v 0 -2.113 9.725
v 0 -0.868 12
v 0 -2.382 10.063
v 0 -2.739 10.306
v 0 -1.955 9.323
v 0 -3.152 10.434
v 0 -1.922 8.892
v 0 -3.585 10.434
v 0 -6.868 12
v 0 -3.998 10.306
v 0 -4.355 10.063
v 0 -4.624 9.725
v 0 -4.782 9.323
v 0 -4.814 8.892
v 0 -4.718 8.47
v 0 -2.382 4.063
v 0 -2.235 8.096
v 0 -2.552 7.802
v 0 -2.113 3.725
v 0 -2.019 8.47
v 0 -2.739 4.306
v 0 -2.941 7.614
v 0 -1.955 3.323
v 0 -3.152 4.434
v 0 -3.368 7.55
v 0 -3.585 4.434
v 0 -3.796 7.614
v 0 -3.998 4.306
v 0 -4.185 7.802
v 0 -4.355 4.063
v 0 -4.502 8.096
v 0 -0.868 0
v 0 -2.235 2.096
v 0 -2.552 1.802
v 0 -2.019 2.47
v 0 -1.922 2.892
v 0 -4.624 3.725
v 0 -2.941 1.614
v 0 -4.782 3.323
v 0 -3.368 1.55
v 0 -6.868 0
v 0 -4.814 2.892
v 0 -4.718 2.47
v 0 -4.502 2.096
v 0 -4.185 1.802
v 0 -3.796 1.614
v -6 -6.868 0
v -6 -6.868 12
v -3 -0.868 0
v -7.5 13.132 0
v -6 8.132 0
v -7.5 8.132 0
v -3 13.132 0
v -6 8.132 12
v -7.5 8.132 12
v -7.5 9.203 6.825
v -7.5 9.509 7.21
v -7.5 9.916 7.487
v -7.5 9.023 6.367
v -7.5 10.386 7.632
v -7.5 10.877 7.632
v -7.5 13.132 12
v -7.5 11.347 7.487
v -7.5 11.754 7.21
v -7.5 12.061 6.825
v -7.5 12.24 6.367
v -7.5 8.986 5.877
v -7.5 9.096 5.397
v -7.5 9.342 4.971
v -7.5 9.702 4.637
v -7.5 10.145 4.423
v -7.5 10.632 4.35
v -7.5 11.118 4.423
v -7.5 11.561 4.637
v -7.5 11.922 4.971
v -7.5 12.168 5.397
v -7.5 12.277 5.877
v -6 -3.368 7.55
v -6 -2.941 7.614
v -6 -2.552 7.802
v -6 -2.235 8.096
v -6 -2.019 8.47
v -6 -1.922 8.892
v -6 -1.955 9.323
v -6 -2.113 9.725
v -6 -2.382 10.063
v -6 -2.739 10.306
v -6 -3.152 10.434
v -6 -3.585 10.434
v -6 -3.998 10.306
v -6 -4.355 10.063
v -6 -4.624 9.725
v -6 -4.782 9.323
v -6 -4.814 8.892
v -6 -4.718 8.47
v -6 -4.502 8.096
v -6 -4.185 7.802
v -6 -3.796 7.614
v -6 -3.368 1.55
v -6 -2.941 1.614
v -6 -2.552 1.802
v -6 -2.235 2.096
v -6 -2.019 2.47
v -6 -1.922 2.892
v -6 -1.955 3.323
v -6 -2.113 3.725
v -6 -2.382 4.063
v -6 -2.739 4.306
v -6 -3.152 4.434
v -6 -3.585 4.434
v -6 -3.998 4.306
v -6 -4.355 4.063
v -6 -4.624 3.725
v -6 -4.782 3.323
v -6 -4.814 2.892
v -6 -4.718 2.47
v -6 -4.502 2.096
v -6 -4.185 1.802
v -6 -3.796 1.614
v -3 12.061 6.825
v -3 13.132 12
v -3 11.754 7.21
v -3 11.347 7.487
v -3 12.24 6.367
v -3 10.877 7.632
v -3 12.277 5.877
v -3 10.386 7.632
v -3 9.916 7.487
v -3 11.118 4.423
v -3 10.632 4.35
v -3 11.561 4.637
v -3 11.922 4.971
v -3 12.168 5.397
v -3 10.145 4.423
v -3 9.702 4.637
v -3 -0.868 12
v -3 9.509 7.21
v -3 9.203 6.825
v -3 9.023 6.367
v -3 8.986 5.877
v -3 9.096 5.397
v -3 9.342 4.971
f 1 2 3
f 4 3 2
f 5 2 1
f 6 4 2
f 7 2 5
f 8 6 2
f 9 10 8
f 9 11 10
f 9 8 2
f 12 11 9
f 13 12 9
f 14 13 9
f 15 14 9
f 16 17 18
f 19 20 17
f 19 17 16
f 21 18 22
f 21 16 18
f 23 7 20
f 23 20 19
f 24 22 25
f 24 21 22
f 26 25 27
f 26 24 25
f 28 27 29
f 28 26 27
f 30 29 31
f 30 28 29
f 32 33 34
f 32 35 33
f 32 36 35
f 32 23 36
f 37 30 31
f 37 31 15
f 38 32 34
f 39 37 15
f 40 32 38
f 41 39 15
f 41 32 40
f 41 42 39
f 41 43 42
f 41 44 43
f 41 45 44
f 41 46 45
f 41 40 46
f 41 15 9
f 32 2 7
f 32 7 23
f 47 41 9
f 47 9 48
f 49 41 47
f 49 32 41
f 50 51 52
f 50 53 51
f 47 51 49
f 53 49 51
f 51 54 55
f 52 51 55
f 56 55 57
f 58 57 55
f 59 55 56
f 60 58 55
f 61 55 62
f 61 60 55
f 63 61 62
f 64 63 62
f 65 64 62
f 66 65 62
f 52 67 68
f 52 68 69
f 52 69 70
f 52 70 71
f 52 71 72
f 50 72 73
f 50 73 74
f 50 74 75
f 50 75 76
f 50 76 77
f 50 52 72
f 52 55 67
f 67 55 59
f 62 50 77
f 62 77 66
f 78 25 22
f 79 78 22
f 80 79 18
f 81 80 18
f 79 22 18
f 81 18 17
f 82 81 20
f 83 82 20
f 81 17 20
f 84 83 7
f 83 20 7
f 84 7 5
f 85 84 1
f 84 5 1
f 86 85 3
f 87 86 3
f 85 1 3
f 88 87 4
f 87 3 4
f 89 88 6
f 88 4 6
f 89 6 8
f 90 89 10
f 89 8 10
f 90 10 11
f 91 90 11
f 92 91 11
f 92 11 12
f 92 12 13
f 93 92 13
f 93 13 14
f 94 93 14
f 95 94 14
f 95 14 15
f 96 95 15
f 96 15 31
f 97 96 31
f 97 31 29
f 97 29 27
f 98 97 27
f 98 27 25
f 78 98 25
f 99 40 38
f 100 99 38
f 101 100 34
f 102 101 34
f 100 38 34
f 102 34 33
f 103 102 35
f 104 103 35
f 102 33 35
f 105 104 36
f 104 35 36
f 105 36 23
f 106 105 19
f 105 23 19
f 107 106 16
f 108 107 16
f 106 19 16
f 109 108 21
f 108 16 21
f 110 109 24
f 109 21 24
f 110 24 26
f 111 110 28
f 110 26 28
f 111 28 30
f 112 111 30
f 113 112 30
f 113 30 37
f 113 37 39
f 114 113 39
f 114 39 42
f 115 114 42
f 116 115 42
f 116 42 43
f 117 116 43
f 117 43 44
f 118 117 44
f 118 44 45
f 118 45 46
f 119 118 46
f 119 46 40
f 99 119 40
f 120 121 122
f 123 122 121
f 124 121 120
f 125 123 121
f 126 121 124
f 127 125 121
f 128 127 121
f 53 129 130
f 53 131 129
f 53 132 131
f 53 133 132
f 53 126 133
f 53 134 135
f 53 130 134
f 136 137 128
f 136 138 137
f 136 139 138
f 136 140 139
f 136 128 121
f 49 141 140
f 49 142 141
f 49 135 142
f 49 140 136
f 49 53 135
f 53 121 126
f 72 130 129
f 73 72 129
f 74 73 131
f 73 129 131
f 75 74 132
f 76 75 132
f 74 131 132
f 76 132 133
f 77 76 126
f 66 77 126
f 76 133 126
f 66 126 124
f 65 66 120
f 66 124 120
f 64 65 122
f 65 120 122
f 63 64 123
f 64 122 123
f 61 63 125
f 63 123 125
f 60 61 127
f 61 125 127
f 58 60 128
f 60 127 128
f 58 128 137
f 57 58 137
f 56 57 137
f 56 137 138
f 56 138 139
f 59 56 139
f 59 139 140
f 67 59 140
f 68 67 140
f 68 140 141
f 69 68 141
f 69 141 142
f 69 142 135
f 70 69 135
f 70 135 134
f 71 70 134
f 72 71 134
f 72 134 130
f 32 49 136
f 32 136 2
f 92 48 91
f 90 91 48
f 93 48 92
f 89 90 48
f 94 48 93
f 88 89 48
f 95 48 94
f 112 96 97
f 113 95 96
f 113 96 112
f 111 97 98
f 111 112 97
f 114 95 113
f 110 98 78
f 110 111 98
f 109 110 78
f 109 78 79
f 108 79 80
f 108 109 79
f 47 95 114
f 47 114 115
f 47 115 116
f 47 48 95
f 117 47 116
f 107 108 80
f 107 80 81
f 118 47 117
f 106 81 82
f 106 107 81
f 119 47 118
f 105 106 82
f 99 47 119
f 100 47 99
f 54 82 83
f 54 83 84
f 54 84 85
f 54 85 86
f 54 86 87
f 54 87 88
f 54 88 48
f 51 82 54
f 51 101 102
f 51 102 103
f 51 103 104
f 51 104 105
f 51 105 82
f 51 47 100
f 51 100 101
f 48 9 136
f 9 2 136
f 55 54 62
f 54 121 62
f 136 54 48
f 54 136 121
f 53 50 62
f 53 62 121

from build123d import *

# Parameters (mm, degrees)
BOSS_EXTRUDE1_DEPTH         = 12
M2_5_CLEARANCE_HOLE1_D      = 2.9
TAP_DRILL_FOR_M4X0_7_TAP1_D = 3.3


with BuildPart() as part:
    # Sketch1 → Boss-Extrude1 (new body)
    with BuildSketch(Plane.XY):
        Polygon((0, -6.868421053), (-6, -6.868421053), (-6, 8.131578947), (-7.5, 8.131578947), (-7.5, 13.131578947), (-3, 13.131578947), (-3, -0.868421053), (0, -0.868421053), align=None)
    extrude(amount=BOSS_EXTRUDE1_DEPTH)

    # M2.5 Clearance Hole1 (through all)
    with Locations(Plane.ZY.offset(6)):
        with Locations((3, -3.368421053), (9, -3.368421053)):
            Hole(M2_5_CLEARANCE_HOLE1_D / 2)

    # Tap Drill for M4x0.7 Tap1 (through all)
    with Locations(Plane.ZY.offset(7.5)):
        with Locations((6, 10.631578947)):
            Hole(TAP_DRILL_FOR_M4X0_7_TAP1_D / 2)


solid = part.part
